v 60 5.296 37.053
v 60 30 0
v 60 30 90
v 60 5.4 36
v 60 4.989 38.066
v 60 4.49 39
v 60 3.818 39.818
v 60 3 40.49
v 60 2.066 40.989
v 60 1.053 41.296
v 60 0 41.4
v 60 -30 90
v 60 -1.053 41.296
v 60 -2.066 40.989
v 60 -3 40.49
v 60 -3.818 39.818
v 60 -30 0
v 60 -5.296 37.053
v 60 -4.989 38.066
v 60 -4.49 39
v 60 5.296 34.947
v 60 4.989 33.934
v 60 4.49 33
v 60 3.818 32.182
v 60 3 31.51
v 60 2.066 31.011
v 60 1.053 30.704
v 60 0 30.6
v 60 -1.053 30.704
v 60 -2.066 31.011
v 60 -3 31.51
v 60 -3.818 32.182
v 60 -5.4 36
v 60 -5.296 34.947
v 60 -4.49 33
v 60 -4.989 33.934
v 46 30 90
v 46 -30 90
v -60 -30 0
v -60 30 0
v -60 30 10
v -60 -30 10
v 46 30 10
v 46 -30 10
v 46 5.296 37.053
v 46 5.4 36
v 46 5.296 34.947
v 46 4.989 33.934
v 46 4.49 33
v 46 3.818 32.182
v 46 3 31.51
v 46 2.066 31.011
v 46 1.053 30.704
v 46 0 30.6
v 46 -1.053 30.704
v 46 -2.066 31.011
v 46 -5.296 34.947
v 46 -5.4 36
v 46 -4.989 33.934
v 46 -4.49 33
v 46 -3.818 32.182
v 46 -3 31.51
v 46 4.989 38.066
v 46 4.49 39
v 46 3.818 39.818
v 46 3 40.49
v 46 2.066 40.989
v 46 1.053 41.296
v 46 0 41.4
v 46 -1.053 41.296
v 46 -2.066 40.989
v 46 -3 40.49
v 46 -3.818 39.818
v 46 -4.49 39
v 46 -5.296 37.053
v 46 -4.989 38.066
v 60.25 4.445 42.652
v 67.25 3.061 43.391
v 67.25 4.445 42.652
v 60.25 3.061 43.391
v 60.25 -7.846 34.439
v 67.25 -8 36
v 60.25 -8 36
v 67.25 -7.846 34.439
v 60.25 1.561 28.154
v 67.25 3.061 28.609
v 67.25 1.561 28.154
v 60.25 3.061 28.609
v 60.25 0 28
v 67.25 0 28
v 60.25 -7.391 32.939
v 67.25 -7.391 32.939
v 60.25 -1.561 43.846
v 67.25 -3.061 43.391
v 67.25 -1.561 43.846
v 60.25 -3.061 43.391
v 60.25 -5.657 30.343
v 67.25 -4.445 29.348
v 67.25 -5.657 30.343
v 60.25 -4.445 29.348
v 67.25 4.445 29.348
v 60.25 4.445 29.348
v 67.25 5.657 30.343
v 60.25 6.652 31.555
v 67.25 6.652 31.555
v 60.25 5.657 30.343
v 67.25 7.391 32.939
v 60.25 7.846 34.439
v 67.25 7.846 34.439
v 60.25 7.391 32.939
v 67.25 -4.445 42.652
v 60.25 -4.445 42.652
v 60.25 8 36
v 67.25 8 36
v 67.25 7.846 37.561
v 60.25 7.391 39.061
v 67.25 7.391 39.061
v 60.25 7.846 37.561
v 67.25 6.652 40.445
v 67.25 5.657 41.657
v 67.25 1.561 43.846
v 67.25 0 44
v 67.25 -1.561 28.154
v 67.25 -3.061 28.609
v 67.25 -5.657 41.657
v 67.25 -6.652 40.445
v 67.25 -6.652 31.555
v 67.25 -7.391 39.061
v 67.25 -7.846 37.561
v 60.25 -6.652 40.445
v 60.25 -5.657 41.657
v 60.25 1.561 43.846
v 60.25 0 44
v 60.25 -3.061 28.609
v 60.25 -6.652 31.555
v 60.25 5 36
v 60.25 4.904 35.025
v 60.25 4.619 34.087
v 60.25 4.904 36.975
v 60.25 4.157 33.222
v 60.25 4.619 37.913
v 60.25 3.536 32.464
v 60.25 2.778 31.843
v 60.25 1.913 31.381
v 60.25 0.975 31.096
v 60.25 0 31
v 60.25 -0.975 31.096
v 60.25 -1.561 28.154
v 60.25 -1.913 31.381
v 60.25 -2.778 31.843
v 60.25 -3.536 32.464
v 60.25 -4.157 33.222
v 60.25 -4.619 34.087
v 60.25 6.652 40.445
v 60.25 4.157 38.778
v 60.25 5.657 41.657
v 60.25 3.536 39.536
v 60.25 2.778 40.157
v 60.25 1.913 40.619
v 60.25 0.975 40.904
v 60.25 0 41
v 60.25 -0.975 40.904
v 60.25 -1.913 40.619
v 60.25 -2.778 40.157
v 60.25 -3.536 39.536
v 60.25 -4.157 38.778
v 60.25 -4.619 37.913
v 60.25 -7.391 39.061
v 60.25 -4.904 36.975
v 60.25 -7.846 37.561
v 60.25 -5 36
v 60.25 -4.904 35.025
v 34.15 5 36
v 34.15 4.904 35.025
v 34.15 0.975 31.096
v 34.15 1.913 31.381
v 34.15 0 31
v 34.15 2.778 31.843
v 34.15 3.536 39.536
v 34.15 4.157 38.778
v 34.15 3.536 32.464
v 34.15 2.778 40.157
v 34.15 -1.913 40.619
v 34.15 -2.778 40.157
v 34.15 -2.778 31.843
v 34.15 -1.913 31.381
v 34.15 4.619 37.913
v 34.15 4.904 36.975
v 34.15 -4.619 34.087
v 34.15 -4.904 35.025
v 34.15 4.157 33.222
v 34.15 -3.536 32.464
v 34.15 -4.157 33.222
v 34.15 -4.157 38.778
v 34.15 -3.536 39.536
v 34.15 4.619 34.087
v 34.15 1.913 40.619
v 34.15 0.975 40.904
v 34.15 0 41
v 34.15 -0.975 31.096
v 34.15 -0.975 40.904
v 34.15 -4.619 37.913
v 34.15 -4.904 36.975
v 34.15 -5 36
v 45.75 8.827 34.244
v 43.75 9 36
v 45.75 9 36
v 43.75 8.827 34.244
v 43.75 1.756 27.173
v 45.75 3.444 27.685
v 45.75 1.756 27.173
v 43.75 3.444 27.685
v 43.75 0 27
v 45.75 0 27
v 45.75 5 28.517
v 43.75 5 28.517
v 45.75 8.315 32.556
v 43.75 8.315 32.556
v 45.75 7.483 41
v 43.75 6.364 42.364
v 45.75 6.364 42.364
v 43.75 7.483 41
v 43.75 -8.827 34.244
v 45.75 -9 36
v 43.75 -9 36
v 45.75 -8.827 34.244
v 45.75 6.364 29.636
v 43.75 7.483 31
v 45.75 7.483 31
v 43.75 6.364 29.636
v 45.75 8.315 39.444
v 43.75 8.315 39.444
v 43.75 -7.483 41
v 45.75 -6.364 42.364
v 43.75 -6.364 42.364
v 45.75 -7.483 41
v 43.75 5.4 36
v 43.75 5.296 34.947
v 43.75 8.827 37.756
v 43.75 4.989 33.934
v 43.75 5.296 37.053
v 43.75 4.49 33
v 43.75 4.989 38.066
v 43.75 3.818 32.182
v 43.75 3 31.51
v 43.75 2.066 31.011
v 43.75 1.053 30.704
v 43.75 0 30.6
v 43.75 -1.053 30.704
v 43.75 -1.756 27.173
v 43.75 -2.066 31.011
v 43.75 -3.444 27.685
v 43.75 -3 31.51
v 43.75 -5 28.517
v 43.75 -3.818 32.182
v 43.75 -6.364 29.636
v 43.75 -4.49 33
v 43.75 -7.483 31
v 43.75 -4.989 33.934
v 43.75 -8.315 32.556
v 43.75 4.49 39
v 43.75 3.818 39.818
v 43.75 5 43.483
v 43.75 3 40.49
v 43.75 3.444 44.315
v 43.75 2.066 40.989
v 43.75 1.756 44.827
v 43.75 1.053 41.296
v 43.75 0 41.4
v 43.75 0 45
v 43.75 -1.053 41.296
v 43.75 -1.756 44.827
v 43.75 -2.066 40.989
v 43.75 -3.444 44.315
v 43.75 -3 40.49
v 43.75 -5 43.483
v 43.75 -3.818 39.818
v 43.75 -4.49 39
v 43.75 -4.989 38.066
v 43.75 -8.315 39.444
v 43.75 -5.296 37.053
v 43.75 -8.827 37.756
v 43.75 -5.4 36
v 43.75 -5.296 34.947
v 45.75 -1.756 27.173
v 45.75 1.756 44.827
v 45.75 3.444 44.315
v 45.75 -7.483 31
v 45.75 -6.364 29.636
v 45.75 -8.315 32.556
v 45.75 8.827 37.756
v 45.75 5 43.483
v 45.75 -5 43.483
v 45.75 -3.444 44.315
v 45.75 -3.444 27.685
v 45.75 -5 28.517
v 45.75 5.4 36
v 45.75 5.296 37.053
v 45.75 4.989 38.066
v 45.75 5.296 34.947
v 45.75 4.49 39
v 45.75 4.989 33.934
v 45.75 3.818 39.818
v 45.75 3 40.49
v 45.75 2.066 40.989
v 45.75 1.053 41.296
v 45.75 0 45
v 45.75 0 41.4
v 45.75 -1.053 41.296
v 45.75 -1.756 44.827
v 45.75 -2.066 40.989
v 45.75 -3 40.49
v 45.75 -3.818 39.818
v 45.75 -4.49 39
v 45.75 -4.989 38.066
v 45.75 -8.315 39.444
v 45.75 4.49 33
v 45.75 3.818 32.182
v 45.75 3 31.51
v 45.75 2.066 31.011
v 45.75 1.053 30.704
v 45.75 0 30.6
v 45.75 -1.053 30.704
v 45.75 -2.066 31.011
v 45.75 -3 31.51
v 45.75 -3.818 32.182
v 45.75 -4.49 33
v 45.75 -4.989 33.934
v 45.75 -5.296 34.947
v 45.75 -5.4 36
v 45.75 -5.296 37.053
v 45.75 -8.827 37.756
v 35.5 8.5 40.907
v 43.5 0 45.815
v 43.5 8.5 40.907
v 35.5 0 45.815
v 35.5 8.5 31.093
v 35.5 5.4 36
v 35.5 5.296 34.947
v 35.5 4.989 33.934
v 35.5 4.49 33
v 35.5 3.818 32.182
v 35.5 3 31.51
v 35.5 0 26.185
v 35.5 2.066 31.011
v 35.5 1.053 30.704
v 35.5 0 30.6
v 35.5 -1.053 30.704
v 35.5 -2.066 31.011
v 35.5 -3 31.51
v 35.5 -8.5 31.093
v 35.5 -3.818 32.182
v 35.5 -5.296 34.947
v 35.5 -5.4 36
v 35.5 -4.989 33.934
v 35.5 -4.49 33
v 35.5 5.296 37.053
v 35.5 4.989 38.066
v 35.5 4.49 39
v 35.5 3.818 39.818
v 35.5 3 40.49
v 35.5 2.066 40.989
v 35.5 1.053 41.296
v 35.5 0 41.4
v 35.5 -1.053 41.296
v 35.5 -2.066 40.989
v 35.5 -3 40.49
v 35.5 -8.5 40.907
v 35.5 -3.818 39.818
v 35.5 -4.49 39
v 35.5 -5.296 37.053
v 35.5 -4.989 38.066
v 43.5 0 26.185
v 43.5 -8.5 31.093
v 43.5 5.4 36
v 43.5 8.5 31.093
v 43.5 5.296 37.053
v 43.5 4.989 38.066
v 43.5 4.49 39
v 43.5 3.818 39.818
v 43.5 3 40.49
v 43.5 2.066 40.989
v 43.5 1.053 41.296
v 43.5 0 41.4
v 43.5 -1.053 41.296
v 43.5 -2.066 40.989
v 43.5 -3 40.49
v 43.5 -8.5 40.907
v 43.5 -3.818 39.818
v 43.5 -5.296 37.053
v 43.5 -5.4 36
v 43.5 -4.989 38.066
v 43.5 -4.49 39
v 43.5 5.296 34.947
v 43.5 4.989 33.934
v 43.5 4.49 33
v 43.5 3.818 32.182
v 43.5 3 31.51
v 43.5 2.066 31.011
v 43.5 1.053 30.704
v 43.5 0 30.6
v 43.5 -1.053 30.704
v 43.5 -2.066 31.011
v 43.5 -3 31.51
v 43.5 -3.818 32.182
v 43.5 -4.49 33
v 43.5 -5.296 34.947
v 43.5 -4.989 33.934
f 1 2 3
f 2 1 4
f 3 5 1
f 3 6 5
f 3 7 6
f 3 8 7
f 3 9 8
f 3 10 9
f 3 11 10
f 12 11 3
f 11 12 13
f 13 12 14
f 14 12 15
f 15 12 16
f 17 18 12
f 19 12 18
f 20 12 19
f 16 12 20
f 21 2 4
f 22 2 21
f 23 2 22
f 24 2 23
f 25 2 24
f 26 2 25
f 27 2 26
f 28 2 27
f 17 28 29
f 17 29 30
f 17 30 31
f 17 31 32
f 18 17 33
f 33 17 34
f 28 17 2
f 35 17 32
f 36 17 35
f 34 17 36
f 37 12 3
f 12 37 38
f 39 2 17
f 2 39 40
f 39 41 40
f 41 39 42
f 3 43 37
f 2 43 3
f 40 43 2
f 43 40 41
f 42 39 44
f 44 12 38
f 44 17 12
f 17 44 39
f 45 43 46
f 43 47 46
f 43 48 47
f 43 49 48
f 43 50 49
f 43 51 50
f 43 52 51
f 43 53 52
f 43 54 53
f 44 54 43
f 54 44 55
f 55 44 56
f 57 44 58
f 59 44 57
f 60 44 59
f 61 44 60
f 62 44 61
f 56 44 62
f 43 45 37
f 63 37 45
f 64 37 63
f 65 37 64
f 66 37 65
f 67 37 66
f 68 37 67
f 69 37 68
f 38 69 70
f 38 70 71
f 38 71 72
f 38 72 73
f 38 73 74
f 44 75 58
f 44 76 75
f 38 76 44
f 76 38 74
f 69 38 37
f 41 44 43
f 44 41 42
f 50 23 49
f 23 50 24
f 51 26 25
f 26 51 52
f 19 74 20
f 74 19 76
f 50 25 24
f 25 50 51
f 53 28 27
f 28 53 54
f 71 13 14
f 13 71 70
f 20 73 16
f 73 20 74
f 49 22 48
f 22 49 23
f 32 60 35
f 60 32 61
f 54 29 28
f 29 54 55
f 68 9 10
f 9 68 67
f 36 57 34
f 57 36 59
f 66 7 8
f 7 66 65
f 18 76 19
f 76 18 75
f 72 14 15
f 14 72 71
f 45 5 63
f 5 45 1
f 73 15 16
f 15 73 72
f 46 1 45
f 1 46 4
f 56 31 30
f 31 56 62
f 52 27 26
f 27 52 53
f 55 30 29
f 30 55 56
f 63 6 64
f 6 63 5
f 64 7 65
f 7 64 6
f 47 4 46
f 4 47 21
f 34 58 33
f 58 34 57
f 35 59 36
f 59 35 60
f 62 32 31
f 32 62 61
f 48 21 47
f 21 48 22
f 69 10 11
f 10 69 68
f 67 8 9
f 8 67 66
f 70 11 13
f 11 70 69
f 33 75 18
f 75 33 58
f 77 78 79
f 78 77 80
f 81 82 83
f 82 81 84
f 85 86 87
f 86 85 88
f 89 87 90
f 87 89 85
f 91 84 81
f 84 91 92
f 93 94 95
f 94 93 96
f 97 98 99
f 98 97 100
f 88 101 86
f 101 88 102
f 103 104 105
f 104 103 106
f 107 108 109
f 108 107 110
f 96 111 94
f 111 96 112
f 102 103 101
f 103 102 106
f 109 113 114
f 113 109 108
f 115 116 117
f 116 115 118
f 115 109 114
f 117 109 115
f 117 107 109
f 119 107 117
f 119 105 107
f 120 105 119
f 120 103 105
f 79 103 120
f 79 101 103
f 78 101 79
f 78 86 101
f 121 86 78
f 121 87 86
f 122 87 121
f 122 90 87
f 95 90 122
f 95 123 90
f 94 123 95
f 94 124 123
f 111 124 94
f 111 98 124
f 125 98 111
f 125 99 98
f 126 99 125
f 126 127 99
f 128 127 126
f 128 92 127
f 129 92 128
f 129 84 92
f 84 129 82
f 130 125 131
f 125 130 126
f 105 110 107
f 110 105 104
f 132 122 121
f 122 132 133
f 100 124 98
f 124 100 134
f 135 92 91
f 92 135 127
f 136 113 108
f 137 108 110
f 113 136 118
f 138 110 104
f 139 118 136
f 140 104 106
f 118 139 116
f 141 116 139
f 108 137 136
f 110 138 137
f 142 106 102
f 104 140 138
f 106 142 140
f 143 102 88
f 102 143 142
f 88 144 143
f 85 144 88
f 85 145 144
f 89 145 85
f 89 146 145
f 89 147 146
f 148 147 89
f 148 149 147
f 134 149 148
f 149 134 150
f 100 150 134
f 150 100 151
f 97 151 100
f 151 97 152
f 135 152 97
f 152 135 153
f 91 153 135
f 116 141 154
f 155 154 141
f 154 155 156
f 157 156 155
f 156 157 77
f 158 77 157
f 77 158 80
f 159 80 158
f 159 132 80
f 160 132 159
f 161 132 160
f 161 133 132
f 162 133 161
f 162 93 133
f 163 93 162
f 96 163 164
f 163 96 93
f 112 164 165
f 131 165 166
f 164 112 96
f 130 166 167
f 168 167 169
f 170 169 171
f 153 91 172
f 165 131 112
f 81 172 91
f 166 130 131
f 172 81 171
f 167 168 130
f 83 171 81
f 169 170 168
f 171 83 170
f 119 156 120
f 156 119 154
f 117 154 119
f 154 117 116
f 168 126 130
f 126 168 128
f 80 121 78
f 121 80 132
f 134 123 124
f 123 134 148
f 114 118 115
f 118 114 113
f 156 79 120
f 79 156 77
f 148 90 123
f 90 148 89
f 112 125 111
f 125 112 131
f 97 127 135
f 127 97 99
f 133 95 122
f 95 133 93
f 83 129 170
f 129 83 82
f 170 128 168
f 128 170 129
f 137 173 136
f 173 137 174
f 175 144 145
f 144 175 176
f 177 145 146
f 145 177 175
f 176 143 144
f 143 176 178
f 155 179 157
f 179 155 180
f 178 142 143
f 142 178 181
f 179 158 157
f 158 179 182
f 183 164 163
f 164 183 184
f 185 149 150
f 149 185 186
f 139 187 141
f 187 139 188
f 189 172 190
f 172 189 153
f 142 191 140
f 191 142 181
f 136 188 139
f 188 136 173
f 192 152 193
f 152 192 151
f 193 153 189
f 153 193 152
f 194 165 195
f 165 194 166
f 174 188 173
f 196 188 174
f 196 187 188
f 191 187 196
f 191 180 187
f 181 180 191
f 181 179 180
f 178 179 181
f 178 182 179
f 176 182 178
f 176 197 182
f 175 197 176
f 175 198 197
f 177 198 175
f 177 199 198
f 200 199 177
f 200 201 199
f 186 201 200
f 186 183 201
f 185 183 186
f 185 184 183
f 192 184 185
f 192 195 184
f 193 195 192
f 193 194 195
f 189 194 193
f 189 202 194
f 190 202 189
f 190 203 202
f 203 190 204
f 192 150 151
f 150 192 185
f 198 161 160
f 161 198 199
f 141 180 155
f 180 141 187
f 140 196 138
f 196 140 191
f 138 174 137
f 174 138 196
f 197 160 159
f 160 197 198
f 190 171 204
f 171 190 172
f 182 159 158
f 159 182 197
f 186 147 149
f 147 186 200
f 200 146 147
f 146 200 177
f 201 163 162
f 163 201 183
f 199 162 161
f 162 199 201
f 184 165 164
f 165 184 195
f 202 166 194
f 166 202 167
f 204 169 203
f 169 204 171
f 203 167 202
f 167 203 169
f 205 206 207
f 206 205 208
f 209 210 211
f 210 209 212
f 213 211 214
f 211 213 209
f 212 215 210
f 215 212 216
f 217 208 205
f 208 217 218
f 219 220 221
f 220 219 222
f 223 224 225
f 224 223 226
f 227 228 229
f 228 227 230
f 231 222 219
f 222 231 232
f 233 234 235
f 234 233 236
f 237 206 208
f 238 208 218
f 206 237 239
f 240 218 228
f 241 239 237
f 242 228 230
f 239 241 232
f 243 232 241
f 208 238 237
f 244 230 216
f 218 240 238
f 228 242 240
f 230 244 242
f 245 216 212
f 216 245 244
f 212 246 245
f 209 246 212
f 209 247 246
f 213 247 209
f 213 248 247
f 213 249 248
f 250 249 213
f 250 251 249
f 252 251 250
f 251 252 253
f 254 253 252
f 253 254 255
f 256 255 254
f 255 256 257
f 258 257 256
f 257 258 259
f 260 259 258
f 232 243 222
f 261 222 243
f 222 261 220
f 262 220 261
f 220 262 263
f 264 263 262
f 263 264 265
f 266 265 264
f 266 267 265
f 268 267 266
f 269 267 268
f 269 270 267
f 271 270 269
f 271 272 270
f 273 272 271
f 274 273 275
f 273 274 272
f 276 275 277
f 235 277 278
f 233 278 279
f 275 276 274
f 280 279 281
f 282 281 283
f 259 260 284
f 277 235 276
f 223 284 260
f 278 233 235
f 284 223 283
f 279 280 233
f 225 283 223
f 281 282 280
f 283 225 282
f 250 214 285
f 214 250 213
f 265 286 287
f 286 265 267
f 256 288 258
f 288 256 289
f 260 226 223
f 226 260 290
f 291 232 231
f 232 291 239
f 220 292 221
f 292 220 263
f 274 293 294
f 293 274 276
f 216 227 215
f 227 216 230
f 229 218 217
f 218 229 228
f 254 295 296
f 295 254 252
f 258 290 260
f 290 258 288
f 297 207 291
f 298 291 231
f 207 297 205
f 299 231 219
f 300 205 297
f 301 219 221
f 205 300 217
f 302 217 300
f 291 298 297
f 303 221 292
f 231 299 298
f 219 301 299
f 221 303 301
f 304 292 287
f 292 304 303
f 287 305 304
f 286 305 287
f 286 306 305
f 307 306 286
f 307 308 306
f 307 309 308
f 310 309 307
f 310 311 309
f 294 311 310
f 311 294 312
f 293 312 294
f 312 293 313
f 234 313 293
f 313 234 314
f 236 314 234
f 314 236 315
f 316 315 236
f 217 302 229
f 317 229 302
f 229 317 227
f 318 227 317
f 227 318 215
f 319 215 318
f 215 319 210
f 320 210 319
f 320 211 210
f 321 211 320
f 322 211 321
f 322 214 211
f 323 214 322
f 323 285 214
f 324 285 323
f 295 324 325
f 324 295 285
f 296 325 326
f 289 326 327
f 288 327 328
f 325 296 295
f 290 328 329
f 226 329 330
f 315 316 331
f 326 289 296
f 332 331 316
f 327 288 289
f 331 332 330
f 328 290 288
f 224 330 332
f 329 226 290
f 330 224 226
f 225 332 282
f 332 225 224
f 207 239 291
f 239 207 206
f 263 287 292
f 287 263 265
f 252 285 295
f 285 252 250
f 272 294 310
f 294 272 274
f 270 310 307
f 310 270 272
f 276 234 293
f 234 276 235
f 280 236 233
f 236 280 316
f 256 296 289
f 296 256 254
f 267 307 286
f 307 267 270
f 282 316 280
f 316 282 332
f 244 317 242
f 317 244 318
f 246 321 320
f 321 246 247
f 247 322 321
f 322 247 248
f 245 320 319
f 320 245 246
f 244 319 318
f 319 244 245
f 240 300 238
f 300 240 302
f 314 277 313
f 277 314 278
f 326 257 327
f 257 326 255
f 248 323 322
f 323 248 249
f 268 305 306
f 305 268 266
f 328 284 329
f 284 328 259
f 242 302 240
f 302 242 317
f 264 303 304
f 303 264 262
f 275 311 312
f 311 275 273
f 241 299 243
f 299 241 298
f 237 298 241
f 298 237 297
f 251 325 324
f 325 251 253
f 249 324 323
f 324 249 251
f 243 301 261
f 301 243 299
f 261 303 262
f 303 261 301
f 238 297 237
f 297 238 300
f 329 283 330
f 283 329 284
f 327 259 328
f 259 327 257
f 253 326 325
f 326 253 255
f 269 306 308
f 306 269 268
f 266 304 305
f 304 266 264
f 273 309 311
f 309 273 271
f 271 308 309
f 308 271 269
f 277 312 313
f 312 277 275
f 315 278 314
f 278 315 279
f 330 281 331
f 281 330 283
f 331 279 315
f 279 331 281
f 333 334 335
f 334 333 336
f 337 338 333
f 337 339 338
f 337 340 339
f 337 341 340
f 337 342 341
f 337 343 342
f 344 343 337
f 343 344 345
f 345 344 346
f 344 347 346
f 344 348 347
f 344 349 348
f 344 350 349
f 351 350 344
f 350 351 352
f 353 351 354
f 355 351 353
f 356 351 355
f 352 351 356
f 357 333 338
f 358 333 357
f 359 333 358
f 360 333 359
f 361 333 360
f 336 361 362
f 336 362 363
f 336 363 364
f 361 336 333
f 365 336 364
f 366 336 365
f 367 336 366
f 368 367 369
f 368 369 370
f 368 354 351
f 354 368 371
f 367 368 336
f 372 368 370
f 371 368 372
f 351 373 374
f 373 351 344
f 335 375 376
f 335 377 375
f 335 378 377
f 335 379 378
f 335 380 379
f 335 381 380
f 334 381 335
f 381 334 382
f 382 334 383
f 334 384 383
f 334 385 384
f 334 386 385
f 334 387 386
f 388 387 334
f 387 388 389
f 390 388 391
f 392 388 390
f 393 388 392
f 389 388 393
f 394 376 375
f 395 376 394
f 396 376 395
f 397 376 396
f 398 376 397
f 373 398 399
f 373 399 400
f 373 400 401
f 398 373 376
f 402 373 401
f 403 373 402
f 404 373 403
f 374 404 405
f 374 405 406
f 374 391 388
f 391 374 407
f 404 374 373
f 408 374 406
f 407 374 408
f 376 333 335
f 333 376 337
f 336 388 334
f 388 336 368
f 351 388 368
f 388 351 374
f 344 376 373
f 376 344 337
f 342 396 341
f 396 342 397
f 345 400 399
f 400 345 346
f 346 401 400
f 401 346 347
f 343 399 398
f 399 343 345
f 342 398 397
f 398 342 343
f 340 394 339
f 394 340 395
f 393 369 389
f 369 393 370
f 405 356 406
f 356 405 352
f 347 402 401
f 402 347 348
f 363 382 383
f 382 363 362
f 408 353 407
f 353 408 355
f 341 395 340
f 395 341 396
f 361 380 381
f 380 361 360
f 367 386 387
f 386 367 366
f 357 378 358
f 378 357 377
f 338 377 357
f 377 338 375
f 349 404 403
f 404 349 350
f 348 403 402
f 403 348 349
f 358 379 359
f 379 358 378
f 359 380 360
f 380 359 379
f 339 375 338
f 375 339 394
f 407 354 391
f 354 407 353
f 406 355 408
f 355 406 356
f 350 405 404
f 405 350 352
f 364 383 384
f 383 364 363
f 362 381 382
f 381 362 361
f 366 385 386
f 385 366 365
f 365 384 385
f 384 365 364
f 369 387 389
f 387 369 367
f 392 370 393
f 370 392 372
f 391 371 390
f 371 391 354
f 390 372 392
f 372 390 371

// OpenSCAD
$fn = 32;

// ------------------------------------------------------------------------
// Bolted bracket: 120 x 60 mm bracket with 1 bolt joints
// Every part is its own module, assembly() places them once.
// ------------------------------------------------------------------------

// --- part 1 ---
module bracket() {
  difference() {
    translate([-60, -30, 0]) cube([120, 60, 90]);
    translate([-61, -31, 10]) cube([107, 62, 81]);
    translate([53, 0, 36]) rotate([0, 90, 0]) cylinder(h = 16, d = 10.8, center = true);
  }
}

// --- part 2 ---
module bolt() {
  cylinder(h = 7, d = 16);
  translate([0, 0, -26.1]) cylinder(h = 26.1, d = 10);
}

// --- part 3 ---
module washer() {
  difference() {
      translate([0, 0, 0]) cylinder(h = 2, d = 18);
      translate([0, 0, -1]) cylinder(h = 4, d = 10.8);
    }
}

// --- part 4 ---
module nut() {
  difference() {
    linear_extrude(height = 8) polygon(points = [[9.815, 0], [4.907, 8.5], [-4.907, 8.5], [-9.815, 0], [-4.907, -8.5], [4.907, -8.5]]);
    translate([0, 0, -1]) cylinder(h = 10, d = 10.8);
  }
}

// --- assembly ---
module assembly() {
  translate([0, 0, 0]) rotate([0, 0, 0]) bracket();
  translate([60.25, 0, 36]) rotate([0, 90, 0]) bolt();
  translate([43.75, 0, 36]) rotate([0, 90, 0]) washer();
  translate([35.5, 0, 36]) rotate([0, 90, 0]) nut();
}

assembly();
